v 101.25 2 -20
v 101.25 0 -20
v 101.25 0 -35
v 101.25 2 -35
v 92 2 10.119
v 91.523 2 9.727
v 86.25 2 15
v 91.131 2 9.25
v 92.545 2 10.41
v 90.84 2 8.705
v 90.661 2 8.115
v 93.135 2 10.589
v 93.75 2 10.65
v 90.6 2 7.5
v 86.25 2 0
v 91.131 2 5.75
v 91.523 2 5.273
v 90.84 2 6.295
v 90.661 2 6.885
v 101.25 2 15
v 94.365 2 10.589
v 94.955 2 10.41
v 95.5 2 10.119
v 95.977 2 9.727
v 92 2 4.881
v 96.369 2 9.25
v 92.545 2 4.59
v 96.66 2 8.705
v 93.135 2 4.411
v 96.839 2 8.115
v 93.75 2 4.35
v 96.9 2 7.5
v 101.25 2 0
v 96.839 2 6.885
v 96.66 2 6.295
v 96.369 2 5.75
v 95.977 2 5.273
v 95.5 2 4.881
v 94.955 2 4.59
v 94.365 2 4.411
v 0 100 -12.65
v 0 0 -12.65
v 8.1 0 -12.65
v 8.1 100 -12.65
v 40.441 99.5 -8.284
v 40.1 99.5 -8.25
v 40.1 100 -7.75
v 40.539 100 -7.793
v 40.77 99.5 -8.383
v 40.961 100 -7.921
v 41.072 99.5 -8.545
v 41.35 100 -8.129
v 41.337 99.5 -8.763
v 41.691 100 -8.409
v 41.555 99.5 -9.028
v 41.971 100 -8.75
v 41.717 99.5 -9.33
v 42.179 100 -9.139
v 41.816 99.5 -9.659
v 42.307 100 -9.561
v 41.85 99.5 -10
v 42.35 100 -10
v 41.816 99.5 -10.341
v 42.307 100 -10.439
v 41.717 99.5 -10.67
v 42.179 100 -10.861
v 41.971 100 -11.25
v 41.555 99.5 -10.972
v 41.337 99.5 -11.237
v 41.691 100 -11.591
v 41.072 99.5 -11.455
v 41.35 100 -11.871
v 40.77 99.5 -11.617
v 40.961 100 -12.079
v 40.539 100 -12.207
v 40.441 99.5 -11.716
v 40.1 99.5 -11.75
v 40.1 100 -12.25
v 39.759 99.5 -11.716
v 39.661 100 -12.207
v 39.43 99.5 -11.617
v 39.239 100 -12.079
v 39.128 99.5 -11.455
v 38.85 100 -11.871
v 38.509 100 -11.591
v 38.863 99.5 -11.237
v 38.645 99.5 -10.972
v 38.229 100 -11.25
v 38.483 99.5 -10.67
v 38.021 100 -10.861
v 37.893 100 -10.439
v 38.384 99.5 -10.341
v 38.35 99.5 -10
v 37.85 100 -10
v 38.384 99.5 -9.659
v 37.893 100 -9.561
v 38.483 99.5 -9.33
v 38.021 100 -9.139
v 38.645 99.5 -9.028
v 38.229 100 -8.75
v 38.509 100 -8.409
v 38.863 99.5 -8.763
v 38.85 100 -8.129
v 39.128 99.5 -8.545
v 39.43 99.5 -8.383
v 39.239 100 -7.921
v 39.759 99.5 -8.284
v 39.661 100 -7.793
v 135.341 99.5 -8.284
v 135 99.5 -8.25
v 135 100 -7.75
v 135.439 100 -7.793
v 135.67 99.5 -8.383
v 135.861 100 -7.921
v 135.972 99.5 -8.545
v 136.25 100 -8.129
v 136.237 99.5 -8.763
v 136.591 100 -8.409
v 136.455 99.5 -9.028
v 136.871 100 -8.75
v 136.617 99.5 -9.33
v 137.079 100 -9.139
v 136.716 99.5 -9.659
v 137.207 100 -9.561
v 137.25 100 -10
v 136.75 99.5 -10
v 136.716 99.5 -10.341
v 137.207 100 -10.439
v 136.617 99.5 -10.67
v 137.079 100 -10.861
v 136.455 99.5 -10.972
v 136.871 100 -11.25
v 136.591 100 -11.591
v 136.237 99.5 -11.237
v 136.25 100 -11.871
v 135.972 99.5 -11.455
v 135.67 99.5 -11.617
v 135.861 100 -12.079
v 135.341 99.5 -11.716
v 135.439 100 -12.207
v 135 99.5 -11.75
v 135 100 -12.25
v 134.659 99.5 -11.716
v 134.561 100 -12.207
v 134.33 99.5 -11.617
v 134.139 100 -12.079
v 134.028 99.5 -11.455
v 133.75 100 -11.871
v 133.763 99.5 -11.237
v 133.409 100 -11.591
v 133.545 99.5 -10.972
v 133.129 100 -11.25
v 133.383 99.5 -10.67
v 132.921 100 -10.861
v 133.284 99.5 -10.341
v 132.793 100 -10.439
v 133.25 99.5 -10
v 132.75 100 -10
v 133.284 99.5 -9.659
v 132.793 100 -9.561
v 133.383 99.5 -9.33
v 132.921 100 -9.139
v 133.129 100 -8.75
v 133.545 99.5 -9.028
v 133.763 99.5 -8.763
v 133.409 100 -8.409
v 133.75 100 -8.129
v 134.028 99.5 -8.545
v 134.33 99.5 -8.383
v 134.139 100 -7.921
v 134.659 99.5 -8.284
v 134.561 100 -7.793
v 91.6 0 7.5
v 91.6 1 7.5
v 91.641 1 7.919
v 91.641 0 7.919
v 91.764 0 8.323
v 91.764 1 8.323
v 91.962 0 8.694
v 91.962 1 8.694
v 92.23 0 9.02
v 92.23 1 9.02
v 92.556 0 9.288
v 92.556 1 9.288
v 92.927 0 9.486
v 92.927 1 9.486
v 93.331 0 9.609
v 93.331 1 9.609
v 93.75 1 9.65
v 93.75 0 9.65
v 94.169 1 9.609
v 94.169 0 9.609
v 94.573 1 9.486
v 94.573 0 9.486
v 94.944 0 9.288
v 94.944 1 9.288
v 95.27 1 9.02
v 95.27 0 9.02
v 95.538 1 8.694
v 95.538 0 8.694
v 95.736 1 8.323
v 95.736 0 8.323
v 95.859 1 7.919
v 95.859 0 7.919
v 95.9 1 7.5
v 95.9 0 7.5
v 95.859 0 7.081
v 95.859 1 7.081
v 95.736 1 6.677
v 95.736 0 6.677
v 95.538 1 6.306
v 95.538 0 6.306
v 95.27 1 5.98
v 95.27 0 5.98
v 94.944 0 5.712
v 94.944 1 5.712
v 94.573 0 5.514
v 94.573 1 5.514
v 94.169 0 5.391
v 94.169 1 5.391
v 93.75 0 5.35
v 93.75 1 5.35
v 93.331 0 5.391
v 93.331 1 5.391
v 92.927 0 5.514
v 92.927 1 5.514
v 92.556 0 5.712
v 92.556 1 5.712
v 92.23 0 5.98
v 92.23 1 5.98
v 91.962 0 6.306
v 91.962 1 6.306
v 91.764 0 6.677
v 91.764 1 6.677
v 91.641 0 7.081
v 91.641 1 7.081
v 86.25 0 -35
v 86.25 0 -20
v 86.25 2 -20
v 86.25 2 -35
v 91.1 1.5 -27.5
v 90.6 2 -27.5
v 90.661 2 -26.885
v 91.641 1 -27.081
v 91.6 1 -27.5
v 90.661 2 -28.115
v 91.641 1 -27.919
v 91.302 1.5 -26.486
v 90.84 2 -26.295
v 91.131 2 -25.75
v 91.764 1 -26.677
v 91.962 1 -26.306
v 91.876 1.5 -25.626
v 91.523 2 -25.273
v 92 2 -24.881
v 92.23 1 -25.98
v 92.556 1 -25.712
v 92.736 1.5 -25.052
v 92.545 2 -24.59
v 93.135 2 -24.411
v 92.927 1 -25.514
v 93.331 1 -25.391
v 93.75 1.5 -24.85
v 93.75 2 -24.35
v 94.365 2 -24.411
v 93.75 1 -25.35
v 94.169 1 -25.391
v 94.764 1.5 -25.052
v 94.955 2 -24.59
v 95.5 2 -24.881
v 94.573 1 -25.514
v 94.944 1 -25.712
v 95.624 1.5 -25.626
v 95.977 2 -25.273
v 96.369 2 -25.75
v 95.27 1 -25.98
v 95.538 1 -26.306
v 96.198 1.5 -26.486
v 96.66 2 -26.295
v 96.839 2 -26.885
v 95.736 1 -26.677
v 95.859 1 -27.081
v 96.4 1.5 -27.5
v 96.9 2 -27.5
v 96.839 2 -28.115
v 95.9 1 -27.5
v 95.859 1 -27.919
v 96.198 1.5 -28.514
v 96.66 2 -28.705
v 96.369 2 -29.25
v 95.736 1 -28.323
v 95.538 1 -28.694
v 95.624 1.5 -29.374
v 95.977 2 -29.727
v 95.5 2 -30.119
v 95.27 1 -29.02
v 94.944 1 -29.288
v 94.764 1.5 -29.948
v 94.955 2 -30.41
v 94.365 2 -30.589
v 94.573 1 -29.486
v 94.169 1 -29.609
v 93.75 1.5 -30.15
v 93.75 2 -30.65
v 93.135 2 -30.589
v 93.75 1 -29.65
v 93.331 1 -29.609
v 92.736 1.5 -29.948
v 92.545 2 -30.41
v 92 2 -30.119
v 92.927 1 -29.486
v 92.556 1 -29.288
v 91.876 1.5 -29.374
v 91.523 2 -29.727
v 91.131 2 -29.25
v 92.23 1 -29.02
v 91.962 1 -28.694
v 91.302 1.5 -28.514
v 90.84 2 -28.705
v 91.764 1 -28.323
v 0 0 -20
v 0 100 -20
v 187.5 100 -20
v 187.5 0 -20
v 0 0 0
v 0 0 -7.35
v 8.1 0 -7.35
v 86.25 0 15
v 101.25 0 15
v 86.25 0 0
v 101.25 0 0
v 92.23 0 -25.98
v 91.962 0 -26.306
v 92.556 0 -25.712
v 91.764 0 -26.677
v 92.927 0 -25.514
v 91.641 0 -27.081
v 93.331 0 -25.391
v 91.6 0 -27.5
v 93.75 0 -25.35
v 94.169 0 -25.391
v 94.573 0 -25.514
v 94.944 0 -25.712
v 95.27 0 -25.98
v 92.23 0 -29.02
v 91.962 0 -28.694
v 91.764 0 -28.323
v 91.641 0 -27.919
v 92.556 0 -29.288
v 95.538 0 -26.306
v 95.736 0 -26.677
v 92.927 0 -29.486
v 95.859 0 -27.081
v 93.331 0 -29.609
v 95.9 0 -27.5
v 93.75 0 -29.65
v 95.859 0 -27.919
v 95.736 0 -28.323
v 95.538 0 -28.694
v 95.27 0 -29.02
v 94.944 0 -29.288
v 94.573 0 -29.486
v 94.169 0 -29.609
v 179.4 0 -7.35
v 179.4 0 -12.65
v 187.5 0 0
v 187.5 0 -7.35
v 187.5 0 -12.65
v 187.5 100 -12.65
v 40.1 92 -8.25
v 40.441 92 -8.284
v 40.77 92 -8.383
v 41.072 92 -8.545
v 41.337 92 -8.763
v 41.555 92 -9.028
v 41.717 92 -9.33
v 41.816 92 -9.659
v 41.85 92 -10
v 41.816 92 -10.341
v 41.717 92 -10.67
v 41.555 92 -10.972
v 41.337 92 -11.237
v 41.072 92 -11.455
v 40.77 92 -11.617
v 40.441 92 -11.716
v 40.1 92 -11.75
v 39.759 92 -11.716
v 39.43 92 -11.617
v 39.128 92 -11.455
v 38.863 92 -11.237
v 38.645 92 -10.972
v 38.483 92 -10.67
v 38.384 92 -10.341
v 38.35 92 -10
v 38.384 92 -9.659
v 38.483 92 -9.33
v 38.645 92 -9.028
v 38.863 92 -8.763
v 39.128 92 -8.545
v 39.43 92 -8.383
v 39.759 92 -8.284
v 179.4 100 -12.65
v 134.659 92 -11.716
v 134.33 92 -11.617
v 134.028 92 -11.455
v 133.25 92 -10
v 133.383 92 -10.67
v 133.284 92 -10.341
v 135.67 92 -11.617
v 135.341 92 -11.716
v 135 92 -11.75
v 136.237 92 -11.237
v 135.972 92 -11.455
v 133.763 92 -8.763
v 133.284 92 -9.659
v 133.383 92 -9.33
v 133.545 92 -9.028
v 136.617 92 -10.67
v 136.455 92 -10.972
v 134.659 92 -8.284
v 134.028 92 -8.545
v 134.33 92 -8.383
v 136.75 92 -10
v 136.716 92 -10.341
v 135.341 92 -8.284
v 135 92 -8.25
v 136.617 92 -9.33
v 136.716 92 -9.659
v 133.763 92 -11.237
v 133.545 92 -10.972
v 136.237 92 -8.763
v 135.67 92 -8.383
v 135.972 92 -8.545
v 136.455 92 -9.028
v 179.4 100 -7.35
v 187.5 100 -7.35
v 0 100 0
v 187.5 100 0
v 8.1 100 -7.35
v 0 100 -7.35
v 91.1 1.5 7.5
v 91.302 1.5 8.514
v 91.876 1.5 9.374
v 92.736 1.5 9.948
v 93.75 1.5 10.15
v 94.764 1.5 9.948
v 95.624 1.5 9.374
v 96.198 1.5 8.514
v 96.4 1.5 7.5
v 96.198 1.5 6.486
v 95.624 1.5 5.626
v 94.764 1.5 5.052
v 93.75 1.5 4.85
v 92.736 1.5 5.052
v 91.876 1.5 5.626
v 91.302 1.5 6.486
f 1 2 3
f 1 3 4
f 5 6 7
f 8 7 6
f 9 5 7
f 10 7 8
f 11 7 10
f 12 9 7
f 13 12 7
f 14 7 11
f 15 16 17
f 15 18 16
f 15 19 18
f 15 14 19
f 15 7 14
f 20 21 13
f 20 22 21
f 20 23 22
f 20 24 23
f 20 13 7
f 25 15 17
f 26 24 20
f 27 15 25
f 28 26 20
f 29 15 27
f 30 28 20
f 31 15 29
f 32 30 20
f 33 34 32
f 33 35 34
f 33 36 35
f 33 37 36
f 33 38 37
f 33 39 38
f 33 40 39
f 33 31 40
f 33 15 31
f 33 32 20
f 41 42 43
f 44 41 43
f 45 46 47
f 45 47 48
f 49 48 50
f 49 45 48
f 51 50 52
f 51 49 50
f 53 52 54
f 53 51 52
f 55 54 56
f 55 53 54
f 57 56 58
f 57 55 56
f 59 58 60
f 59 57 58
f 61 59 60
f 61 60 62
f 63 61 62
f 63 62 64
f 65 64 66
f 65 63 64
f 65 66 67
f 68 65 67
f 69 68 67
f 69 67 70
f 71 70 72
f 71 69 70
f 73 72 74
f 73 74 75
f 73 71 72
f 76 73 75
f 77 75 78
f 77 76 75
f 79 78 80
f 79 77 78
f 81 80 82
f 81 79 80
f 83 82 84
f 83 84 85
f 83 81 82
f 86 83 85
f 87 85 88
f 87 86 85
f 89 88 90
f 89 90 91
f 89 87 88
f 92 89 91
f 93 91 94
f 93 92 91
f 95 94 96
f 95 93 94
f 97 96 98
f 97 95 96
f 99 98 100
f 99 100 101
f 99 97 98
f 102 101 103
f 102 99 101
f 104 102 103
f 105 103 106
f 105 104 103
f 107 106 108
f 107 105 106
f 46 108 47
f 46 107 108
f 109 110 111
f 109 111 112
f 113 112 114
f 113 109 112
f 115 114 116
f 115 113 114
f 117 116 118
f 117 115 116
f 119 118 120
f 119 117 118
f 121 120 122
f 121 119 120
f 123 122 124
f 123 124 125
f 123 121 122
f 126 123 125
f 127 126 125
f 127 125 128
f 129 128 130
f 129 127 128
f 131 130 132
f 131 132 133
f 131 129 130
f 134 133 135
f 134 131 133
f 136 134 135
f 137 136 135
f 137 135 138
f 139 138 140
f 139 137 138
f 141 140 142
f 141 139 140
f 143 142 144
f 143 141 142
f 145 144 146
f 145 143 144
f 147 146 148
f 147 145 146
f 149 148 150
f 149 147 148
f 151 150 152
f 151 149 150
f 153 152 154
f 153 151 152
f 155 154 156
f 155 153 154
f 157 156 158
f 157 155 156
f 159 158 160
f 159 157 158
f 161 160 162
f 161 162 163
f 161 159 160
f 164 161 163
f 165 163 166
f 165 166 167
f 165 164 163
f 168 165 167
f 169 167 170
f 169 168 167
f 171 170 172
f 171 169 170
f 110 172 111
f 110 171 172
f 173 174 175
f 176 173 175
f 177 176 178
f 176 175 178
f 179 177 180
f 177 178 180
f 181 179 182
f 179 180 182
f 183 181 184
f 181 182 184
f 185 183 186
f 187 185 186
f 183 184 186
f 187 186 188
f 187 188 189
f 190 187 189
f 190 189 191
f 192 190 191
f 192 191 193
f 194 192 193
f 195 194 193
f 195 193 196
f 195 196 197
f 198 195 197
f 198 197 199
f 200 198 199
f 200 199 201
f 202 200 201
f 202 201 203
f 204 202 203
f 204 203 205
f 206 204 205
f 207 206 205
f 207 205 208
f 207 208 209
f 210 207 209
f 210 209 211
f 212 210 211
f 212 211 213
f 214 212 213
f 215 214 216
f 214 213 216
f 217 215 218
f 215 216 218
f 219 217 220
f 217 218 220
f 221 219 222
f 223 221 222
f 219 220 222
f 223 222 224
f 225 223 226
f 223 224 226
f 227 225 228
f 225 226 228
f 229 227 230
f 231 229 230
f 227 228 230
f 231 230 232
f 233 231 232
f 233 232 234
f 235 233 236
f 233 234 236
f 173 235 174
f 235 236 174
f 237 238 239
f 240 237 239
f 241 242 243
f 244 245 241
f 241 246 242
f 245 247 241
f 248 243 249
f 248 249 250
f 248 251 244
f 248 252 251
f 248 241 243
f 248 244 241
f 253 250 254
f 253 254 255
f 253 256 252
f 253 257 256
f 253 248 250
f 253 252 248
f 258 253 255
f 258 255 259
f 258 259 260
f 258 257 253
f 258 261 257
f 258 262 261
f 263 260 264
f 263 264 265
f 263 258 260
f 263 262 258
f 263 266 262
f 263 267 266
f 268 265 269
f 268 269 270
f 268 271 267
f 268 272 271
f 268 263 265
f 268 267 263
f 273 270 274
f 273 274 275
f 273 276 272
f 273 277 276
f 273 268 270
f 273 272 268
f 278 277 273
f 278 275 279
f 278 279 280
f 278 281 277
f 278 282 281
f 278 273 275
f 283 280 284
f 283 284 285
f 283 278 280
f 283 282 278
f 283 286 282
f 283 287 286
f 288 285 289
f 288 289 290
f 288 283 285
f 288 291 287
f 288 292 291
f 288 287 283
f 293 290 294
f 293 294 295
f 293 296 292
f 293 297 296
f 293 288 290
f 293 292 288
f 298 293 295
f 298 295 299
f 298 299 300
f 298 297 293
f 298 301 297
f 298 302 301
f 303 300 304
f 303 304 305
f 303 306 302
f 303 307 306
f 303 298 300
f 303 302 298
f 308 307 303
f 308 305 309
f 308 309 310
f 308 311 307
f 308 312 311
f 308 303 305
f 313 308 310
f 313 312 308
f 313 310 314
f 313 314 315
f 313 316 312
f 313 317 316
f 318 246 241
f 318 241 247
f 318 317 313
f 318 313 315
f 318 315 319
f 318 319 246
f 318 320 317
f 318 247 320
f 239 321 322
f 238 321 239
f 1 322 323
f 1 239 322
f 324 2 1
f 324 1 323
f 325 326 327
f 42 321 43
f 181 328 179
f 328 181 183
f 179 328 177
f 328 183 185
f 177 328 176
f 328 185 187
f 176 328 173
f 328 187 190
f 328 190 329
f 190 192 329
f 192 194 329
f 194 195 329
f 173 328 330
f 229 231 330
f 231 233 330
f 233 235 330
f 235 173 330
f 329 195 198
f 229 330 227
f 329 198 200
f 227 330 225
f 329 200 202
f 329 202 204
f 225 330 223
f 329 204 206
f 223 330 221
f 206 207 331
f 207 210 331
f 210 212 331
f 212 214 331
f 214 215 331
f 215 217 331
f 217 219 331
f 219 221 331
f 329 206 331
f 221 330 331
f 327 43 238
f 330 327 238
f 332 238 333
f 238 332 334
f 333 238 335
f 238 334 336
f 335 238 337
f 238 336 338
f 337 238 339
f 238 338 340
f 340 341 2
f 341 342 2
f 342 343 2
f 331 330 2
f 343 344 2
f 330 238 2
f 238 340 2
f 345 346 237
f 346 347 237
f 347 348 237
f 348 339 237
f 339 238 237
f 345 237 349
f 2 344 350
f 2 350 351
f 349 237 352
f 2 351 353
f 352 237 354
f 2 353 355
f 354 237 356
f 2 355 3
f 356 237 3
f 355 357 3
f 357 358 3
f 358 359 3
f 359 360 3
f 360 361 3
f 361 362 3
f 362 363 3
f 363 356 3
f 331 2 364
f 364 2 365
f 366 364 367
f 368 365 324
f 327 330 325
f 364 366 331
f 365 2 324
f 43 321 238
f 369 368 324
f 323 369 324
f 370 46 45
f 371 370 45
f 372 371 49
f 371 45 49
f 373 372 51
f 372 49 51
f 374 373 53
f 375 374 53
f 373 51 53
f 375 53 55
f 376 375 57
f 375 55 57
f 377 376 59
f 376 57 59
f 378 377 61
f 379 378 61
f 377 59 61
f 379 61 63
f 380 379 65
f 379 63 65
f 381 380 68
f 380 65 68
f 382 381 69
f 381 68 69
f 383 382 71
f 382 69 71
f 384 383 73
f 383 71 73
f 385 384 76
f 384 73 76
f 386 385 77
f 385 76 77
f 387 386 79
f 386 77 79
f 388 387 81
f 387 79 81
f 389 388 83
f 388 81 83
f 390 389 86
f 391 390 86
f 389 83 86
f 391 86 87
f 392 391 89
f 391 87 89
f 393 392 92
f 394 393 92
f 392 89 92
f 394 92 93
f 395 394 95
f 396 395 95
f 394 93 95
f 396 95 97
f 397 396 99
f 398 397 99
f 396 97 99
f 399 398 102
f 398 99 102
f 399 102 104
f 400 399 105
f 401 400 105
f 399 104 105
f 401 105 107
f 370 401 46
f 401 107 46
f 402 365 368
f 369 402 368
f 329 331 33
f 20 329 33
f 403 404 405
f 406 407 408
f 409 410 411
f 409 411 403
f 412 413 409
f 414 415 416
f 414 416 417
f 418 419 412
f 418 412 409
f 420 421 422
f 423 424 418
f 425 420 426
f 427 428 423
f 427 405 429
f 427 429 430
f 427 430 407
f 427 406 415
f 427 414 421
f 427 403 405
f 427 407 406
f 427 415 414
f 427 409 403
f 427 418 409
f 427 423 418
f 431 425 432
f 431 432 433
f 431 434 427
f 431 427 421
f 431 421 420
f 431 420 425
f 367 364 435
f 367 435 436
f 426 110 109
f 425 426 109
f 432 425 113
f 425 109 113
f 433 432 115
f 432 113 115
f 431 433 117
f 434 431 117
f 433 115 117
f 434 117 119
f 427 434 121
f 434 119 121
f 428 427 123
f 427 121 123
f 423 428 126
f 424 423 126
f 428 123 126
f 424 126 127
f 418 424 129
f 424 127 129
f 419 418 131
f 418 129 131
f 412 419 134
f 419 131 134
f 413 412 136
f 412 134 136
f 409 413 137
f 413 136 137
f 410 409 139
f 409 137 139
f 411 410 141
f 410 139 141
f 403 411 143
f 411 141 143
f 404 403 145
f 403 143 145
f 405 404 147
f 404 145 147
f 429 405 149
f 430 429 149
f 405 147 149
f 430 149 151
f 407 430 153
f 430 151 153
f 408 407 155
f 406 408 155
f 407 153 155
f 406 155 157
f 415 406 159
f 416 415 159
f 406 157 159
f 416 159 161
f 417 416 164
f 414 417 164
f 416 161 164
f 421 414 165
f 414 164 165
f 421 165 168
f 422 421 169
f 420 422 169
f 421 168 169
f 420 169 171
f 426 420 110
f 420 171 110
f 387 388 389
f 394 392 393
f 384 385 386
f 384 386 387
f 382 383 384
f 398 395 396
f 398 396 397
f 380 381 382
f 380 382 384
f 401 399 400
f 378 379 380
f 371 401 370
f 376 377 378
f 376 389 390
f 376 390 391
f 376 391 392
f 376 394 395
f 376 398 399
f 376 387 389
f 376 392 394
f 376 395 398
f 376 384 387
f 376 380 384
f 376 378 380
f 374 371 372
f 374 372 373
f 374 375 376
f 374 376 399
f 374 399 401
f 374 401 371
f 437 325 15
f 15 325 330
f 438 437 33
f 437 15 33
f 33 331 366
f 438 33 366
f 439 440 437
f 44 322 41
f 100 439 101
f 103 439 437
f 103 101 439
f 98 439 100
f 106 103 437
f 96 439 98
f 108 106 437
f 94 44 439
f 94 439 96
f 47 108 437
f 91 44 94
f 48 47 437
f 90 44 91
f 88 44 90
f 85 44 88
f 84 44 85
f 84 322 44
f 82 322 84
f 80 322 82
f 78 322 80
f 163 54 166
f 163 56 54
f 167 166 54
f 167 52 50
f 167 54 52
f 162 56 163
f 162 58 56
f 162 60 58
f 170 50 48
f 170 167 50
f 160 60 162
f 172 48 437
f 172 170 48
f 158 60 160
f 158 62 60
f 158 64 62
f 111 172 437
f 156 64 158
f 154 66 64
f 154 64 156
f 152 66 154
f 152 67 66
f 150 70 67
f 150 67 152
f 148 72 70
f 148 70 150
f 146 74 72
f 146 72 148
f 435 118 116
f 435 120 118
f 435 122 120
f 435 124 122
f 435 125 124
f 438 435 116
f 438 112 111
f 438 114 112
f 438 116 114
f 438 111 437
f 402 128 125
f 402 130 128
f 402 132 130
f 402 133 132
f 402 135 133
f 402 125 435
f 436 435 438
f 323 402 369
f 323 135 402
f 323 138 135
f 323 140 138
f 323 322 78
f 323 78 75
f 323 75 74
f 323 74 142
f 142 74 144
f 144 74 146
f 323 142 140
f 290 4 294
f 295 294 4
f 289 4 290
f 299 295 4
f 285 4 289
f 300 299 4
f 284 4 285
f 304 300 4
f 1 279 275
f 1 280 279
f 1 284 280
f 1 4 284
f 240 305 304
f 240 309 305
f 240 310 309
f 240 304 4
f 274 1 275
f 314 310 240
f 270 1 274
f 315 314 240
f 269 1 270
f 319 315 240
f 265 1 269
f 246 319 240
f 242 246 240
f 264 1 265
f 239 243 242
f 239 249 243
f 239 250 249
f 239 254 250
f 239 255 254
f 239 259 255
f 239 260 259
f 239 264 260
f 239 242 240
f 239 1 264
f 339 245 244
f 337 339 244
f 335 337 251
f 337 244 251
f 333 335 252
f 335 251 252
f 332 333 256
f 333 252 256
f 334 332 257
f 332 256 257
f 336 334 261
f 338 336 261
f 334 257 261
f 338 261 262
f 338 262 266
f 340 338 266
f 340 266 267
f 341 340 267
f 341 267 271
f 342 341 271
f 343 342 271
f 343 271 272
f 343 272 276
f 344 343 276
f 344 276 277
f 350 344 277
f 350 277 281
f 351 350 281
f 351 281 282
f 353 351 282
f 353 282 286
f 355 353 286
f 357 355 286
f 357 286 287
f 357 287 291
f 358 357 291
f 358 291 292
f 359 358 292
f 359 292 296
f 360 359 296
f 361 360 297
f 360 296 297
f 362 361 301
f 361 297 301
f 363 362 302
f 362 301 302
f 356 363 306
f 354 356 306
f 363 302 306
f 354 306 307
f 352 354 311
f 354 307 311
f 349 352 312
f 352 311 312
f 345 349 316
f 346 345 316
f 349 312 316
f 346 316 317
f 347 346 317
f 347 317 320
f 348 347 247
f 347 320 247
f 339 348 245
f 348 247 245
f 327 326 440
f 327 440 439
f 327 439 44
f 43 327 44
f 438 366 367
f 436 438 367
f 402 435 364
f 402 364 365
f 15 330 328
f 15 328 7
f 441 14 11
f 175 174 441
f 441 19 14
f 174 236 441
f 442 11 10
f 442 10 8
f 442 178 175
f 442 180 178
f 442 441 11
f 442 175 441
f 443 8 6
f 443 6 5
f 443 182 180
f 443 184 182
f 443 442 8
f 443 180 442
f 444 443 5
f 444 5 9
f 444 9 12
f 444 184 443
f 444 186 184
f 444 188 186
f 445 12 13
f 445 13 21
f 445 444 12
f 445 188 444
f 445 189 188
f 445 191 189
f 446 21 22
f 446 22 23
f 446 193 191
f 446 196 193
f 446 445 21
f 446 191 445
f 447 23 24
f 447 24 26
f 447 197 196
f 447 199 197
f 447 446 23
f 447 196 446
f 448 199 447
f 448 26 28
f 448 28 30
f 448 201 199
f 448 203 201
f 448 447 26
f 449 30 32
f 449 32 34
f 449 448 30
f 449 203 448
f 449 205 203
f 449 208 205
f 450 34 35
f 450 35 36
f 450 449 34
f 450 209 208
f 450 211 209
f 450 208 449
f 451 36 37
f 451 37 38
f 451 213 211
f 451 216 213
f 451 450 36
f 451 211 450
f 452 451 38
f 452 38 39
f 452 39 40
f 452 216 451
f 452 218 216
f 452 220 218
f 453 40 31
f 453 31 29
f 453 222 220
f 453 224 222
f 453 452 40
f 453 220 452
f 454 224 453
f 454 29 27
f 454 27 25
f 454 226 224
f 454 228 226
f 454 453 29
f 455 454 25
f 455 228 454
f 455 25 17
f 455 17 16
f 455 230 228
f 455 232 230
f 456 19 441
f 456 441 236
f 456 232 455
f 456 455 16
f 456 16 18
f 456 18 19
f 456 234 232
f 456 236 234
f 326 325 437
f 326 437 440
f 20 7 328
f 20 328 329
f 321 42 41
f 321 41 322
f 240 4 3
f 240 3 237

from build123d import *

# Parameters (mm, degrees)
SKETCH1_W           = 187.5
SKETCH1_H           = 20
BOSS_EXTRUDE1_DEPTH = 100
SKETCH2_W           = 8.1
SKETCH2_H           = 5.3
CUT_EXTRUDE1_DEPTH  = 100
SKETCH3_R           = 1.75
CUT_EXTRUDE2_DEPTH  = 8
CHAMFER1_SIZE       = 0.5
CHAMFER2_SIZE       = 0.5
SKETCH4_W           = 15
SKETCH4_H           = 2
BOSS_EXTRUDE2_DEPTH = 15
SKETCH5_W           = 15
SKETCH5_H           = 2
BOSS_EXTRUDE3_DEPTH = 15
SKETCH6_R           = 2.15
CUT_EXTRUDE3_DEPTH  = 15
CHAMFER3_SIZE       = 1


with BuildPart() as part:
    # Sketch1 → Boss-Extrude1 (new body)
    with BuildSketch(Plane(origin=(0, 0, 0), x_dir=(1, 0, 0), z_dir=(0, 1, 0))):
        with Locations((93.75, 10)):
            Rectangle(SKETCH1_W, SKETCH1_H)
    extrude(amount=BOSS_EXTRUDE1_DEPTH)

    # Sketch2 → Cut-Extrude1 (cut)
    with BuildSketch(Plane(origin=(0, 100, 0), x_dir=(1, 0, 0), z_dir=(0, 1, 0))):
        with Locations((4.05, 10)):
            Rectangle(SKETCH2_W, SKETCH2_H)
        with Locations((183.45, 10)):
            Rectangle(SKETCH2_W, SKETCH2_H)
    extrude(amount=-CUT_EXTRUDE1_DEPTH, mode=Mode.SUBTRACT)

    # Sketch3 → Cut-Extrude2 (cut)
    with BuildSketch(Plane(origin=(0, 100, 0), x_dir=(1, 0, 0), z_dir=(0, 1, 0))):
        with Locations(Location((40.1, 10, 0), (0, 0, 270))):
            Circle(SKETCH3_R)
        with Locations(Location((135, 10, 0), (0, 0, 270))):
            Circle(SKETCH3_R)
    extrude(amount=-CUT_EXTRUDE2_DEPTH, mode=Mode.SUBTRACT)

    # Chamfer1
    chamfer1_edges = [part.edges().sort_by_distance(p)[0] for p in [
        (40.1, 100, -11.75),
    ]]
    chamfer(chamfer1_edges, length=CHAMFER1_SIZE)

    # Chamfer2
    chamfer2_edges = [part.edges().sort_by_distance(p)[0] for p in [
        (135, 100, -11.75),
    ]]
    chamfer(chamfer2_edges, length=CHAMFER2_SIZE)

    # Sketch4 → Boss-Extrude2 (add)
    with BuildSketch(Plane(origin=(0, 0, -20), x_dir=(-1, 0, 0), z_dir=(0, 0, -1))):
        with Locations((-93.75, 1)):
            Rectangle(SKETCH4_W, SKETCH4_H)
    extrude(amount=BOSS_EXTRUDE2_DEPTH)

    # Sketch5 → Boss-Extrude3 (add)
    with BuildSketch(Plane.XY):
        with Locations((93.75, 1)):
            Rectangle(SKETCH5_W, SKETCH5_H)
    extrude(amount=BOSS_EXTRUDE3_DEPTH)

    # Sketch6 → Cut-Extrude3 (cut)
    with BuildSketch(Plane(origin=(0, 2, 0), x_dir=(1, 0, 0), z_dir=(0, 1, 0))):
        with Locations(Location((93.75, 27.5, 0), (0, 0, 180))):
            Circle(SKETCH6_R)
        with Locations(Location((93.75, -7.5, 0), (0, 0, 180))):
            Circle(SKETCH6_R)
    extrude(amount=-CUT_EXTRUDE3_DEPTH, mode=Mode.SUBTRACT)

    # Chamfer3
    chamfer3_edges = [part.edges().sort_by_distance(p)[0] for p in [
        (95.9, 2, -27.5),
        (95.9, 2, 7.5),
    ]]
    chamfer(chamfer3_edges, length=CHAMFER3_SIZE)


solid = part.part
